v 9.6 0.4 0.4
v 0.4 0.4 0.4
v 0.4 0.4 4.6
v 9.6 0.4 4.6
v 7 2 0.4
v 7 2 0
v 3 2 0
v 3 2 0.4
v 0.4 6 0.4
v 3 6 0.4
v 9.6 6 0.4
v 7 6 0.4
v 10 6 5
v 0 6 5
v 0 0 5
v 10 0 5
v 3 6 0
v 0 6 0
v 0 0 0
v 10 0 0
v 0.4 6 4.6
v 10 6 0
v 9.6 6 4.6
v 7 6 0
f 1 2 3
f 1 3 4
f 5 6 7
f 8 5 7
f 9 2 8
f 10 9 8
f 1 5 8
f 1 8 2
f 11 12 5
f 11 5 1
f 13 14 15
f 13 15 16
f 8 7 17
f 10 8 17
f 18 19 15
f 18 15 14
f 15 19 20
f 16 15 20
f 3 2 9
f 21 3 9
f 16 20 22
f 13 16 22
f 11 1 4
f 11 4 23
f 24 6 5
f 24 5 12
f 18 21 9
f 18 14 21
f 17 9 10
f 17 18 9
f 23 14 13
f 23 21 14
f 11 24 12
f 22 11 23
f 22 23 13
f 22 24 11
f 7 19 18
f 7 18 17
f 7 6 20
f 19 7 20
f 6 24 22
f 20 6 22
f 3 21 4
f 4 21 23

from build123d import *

# Parameters (mm, degrees)
SKETCH_1_W          = 10
SKETCH_1_H          = 6
EXTRUDE_1_DEPTH     = 5
SHELL_1_T           = -0.4
CUT_EXTRUDE_1_REACH = 14.689
SKETCH_2_W          = 4
SKETCH_2_H          = 4


with BuildPart() as part:
    # 草图1 → 凸台-拉伸1 (new body)
    with BuildSketch(Plane.XY):
        with Locations((5, 3)):
            Rectangle(SKETCH_1_W, SKETCH_1_H)
    extrude(amount=EXTRUDE_1_DEPTH)

    # 抽壳1
    shell_1_openings = [part.faces().sort_by_distance(p)[0] for p in [
        (5, 6, 2.5),
    ]]
    offset(amount=SHELL_1_T, openings=shell_1_openings, kind=Kind.INTERSECTION)

    # 草图2 → 切除-拉伸1 (cut, up to next)
    with BuildSketch(Plane(origin=(0, 0, 0), x_dir=(-1, 0, 0), z_dir=(0, 0, -1)), mode=Mode.PRIVATE) as cut_extrude_1_sk1:
        with Locations((-5, 4)):
            Rectangle(SKETCH_2_W, SKETCH_2_H)
    cut_extrude_1_tool1 = extrude(cut_extrude_1_sk1.sketch, amount=-CUT_EXTRUDE_1_REACH, mode=Mode.PRIVATE) & part.part
    add(cut_extrude_1_tool1.solids().sort_by_distance((5, 4, 0))[0], mode=Mode.SUBTRACT)


solid = part.part
